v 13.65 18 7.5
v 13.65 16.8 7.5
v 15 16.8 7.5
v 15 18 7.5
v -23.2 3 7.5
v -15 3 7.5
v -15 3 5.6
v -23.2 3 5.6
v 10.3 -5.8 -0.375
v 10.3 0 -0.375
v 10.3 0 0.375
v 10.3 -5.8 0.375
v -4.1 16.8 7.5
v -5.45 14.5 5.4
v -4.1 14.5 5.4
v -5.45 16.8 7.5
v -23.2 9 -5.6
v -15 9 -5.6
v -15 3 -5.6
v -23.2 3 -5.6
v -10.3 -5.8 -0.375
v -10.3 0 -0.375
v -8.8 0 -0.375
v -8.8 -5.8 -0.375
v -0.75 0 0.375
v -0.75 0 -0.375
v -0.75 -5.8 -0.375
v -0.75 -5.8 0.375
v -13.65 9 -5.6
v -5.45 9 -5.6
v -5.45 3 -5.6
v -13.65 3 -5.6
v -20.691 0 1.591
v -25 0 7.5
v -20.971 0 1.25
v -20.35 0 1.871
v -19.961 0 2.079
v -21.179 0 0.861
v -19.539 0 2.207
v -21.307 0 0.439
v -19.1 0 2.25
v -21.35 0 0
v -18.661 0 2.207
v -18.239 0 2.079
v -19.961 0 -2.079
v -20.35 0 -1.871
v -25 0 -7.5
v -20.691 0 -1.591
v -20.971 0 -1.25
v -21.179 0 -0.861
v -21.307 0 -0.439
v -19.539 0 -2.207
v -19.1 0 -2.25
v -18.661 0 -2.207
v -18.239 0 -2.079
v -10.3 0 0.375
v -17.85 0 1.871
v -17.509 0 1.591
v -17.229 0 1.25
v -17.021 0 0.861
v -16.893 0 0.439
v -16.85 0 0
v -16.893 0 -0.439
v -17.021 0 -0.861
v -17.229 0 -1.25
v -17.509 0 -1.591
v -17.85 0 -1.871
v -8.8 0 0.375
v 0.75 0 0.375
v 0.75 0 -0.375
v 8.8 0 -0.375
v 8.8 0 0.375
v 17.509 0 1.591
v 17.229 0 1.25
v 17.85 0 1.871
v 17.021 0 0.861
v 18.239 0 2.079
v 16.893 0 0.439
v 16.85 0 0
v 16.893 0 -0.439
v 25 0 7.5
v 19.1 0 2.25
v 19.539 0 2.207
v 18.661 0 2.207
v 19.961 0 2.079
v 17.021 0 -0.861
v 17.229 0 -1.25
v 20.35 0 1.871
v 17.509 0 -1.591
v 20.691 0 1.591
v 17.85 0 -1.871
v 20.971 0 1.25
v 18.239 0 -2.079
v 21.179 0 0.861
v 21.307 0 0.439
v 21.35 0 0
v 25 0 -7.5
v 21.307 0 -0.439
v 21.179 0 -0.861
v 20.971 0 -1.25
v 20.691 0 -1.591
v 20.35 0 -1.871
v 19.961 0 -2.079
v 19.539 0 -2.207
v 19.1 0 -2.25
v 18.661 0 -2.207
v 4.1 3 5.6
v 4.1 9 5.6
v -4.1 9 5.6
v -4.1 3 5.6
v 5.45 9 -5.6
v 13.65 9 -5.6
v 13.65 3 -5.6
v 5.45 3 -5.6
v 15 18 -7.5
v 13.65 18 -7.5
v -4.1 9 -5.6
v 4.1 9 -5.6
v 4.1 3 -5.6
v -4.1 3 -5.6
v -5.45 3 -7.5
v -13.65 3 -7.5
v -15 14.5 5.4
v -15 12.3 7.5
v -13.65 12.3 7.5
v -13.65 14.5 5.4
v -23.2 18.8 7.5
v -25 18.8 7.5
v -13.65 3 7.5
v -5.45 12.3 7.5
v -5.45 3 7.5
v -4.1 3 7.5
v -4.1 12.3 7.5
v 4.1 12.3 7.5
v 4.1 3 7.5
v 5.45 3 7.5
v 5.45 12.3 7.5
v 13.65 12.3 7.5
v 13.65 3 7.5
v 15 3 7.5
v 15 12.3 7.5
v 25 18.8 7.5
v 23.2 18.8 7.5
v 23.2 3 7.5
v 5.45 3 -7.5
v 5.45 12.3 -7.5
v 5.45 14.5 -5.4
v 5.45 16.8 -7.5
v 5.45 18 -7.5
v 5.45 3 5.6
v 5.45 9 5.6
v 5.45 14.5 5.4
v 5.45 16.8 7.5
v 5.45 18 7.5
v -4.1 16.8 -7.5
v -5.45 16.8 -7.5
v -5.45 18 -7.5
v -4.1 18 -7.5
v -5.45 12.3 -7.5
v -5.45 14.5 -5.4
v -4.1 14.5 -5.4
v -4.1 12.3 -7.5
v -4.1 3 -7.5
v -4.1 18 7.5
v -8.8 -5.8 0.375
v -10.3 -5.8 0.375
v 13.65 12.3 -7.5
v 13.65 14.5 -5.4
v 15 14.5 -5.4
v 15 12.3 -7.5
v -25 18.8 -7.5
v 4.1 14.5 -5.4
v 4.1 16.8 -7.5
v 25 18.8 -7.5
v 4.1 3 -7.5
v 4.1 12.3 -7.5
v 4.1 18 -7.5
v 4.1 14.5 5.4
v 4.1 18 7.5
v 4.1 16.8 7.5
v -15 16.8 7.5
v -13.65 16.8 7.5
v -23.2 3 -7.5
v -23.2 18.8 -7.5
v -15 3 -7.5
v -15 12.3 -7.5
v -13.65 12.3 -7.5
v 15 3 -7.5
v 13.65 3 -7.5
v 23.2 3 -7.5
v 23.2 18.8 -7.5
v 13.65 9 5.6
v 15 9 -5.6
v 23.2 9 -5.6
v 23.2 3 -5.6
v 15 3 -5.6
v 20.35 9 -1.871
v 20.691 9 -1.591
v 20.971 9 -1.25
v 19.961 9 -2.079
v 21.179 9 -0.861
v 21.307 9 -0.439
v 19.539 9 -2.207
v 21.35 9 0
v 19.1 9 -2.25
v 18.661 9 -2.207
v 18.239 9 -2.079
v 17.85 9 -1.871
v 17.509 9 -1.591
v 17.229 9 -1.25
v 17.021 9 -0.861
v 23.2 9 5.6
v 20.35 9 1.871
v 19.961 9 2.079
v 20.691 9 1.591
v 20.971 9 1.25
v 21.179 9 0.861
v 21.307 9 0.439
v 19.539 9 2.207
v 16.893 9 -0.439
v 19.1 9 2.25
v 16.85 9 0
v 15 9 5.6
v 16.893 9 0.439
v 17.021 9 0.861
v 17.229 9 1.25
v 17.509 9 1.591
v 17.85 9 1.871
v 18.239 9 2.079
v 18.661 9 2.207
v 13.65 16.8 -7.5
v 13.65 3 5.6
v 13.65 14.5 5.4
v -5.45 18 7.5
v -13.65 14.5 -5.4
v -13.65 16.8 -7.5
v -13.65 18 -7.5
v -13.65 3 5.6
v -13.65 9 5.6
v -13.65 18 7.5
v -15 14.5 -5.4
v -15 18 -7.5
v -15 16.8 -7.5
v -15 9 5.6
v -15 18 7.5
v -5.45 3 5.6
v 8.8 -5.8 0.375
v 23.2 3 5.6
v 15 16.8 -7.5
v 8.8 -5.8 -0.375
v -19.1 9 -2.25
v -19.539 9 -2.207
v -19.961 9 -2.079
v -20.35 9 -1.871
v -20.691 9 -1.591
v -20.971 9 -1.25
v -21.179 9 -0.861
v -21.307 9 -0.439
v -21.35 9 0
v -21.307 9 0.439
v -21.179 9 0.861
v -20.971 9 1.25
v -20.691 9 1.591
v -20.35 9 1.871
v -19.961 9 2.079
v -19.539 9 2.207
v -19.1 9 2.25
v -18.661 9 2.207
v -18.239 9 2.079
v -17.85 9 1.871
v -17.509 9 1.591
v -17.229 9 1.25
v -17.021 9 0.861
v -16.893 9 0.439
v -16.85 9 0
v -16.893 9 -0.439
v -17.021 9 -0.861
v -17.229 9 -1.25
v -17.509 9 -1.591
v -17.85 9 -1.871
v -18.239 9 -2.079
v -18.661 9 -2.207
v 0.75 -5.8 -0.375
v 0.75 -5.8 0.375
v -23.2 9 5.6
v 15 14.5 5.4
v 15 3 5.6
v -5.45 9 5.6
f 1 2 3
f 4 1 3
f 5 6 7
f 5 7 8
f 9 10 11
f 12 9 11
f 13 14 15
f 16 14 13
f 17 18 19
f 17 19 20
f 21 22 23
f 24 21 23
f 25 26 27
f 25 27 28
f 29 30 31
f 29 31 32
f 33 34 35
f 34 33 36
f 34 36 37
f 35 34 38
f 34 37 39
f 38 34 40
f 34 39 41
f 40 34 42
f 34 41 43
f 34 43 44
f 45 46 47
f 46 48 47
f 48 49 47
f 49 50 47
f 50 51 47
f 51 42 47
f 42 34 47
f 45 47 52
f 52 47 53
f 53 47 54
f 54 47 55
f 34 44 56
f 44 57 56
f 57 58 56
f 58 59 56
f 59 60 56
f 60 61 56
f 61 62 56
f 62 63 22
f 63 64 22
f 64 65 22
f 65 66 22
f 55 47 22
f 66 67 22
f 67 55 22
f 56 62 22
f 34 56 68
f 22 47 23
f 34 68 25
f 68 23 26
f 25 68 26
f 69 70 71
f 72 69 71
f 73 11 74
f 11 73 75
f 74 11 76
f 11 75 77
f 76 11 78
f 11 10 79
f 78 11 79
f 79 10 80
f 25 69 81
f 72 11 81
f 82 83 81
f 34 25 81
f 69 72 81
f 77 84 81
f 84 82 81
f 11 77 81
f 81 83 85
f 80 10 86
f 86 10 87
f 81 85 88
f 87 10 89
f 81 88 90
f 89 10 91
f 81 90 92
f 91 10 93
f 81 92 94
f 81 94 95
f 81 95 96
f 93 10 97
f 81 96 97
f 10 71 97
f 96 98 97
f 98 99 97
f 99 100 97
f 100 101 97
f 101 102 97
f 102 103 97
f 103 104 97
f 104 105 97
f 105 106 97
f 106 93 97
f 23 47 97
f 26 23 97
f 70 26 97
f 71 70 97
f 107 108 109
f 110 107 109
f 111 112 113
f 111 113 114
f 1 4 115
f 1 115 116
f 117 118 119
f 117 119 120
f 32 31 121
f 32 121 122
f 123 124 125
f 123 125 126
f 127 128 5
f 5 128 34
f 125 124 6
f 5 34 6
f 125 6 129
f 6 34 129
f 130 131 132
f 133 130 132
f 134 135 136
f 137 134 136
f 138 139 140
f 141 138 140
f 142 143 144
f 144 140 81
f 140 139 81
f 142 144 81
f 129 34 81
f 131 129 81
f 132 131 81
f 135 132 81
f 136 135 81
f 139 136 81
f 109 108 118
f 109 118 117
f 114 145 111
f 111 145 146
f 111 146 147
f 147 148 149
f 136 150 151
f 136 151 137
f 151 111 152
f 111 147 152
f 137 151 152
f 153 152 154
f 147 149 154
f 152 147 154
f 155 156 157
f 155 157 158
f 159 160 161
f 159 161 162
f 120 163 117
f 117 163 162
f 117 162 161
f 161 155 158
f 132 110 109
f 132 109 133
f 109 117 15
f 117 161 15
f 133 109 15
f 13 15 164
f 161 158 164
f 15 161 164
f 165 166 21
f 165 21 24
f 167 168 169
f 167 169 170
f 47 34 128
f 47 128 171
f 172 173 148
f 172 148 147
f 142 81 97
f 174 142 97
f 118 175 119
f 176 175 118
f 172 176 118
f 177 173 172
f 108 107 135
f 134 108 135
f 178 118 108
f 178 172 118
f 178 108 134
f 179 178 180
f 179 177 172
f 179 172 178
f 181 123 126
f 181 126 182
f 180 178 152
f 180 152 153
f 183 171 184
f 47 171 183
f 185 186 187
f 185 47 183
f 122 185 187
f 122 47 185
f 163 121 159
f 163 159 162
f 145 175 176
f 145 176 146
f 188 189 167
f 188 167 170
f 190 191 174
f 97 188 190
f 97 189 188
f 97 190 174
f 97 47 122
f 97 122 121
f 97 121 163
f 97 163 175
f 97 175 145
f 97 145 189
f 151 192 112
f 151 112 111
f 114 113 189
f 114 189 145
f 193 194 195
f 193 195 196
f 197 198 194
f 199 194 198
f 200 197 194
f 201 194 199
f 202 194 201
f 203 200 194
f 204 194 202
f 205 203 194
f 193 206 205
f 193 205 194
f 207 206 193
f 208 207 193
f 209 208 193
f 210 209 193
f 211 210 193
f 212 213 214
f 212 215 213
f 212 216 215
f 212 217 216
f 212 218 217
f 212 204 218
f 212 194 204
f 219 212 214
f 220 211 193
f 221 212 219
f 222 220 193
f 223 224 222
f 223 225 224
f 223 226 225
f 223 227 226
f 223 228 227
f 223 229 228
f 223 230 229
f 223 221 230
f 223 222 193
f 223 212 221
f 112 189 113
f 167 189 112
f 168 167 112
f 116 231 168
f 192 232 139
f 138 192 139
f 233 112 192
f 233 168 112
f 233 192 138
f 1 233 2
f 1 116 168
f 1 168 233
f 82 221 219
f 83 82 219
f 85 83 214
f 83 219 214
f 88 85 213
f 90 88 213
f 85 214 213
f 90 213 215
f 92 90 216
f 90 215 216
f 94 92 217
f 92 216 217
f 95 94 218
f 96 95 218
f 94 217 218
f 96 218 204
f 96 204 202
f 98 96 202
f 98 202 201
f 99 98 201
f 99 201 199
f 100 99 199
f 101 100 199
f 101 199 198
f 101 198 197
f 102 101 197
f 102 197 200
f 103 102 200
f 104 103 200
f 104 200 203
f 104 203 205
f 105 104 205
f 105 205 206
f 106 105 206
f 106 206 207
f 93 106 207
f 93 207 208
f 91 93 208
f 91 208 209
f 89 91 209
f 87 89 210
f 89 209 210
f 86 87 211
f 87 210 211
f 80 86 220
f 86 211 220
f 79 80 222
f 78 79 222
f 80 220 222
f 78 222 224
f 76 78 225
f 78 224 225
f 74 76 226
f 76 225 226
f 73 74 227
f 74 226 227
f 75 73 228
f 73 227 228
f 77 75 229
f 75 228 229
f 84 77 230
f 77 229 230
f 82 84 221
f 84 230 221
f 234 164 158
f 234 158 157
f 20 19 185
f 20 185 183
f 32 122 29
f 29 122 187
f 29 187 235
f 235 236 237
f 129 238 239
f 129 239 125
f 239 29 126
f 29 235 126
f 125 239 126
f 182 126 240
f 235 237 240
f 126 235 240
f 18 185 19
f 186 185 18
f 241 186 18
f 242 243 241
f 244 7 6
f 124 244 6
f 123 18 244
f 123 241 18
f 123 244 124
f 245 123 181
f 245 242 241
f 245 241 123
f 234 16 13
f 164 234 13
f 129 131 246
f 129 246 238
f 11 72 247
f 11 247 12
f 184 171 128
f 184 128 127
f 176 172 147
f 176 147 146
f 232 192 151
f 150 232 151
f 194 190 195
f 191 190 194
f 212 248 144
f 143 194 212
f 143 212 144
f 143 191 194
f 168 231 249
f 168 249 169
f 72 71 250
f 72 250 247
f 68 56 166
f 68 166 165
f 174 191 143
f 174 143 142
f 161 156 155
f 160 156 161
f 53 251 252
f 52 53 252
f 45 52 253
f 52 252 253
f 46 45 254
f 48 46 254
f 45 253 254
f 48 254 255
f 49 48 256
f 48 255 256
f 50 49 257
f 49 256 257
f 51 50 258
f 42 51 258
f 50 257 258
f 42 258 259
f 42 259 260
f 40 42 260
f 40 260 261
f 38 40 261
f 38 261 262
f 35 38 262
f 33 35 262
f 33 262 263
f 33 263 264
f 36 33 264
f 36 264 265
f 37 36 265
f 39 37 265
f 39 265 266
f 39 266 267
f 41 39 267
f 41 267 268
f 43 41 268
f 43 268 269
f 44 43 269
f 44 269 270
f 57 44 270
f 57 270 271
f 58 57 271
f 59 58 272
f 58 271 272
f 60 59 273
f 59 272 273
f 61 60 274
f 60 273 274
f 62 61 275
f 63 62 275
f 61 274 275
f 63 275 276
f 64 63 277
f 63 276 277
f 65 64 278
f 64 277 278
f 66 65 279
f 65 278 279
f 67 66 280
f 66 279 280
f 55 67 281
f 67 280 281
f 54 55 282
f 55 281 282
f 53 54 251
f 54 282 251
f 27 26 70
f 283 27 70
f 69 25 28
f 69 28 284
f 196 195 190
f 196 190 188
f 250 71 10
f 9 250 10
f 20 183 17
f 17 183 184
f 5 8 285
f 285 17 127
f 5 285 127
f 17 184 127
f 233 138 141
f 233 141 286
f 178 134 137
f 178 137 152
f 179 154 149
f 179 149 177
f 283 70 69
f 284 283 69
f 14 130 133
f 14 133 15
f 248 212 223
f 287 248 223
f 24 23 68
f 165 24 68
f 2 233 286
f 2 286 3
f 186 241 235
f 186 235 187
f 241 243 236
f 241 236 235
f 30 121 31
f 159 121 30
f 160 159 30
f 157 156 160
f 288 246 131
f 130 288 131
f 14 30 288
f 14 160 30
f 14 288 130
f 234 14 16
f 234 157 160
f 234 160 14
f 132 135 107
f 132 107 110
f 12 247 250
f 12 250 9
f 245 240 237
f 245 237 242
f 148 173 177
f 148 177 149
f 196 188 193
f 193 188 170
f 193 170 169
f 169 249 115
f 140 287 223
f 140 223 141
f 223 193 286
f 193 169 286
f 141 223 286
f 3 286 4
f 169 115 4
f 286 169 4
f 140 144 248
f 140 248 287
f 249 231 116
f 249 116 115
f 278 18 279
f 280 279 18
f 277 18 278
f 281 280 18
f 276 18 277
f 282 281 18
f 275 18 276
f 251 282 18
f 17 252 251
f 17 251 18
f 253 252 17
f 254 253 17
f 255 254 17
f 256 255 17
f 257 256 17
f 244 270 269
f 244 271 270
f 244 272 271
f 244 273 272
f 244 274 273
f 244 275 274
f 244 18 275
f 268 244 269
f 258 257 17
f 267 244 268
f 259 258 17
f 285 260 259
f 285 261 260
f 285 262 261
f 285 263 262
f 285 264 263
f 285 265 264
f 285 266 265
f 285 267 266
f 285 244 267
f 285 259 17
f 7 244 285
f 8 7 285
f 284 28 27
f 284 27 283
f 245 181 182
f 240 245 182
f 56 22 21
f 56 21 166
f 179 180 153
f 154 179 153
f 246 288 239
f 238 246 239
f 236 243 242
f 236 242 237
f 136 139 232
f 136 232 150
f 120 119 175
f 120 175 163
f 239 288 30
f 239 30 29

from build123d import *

# Parameters (mm, degrees)
SKETCH_1_W          = 50
SKETCH_1_H          = 15
EXTRUDE_1_DEPTH     = 18.8
SKETCH_2_W          = 46.4
SKETCH_2_H          = 15
CUT_EXTRUDE_1_DEPTH = 0.8
SKETCH_4_W          = 8.2
SKETCH_4_H          = 15
CUT_EXTRUDE_2_DEPTH = 9
SKETCH_5_W          = 8.2
SKETCH_5_H          = 1.9
CUT_EXTRUDE_3_DEPTH = 15
SKETCH_6_W          = 1.5
SKETCH_6_H          = 0.75
EXTRUDE_2_DEPTH     = 5.8
SKETCH_7_R          = 2.25
CUT_EXTRUDE_4_DEPTH = 31.004832944
CUT_EXTRUDE_START   = -30
CUT_EXTRUDE_5_DEPTH = 30


with BuildPart() as part:
    # 草图1 → 拉伸1 (new body)
    with BuildSketch(Plane(origin=(0, 0, 0), x_dir=(1, 0, 0), z_dir=(0, 1, 0))):
        Rectangle(SKETCH_1_W, SKETCH_1_H)
    extrude(amount=EXTRUDE_1_DEPTH)

    # 草图2 → 切除-拉伸1 (cut)
    with BuildSketch(Plane(origin=(0, 18.8, 0), x_dir=(-1, 0, 0), z_dir=(0, 1, 0))):
        Rectangle(SKETCH_2_W, SKETCH_2_H)
    extrude(amount=-CUT_EXTRUDE_1_DEPTH, mode=Mode.SUBTRACT)

    # 草图4 → 切除-拉伸2 (cut)
    with BuildSketch(Plane(origin=(0, 18, 0), x_dir=(-1, 0, 0), z_dir=(0, 1, 0))):
        with Locations((-19.1, 0)):
            Rectangle(SKETCH_4_W, SKETCH_4_H)
        with Locations((-9.55, 0)):
            Rectangle(SKETCH_4_W, SKETCH_4_H)
        Rectangle(SKETCH_4_W, SKETCH_4_H)
        with Locations((9.55, 0)):
            Rectangle(SKETCH_4_W, SKETCH_4_H)
        with Locations((19.1, 0)):
            Rectangle(SKETCH_4_W, SKETCH_4_H)
    extrude(amount=-CUT_EXTRUDE_2_DEPTH, mode=Mode.SUBTRACT)

    # 草图5 → 切除-拉伸3 (cut)
    with BuildSketch(Plane(origin=(0, 18, 0), x_dir=(-1, 0, 0), z_dir=(0, 1, 0))):
        with Locations((19.1, -6.55)):
            Rectangle(SKETCH_5_W, SKETCH_5_H)
        with Locations((19.1, 6.55)):
            Rectangle(SKETCH_5_W, SKETCH_5_H)
        with Locations((9.55, -6.55)):
            Rectangle(SKETCH_5_W, SKETCH_5_H)
        with Locations((9.55, 6.55)):
            Rectangle(SKETCH_5_W, SKETCH_5_H)
        with Locations((0, -6.55)):
            Rectangle(SKETCH_5_W, SKETCH_5_H)
        with Locations((0, 6.55)):
            Rectangle(SKETCH_5_W, SKETCH_5_H)
        with Locations((-9.55, -6.55)):
            Rectangle(SKETCH_5_W, SKETCH_5_H)
        with Locations((-9.55, 6.55)):
            Rectangle(SKETCH_5_W, SKETCH_5_H)
        with Locations((-19.1, -6.55)):
            Rectangle(SKETCH_5_W, SKETCH_5_H)
        with Locations((-19.1, 6.55)):
            Rectangle(SKETCH_5_W, SKETCH_5_H)
    extrude(amount=-CUT_EXTRUDE_3_DEPTH, mode=Mode.SUBTRACT)

    # 草图6 → 拉伸2 (add)
    with BuildSketch(Plane.XZ):
        Rectangle(SKETCH_6_W, SKETCH_6_H)
        with Locations((9.55, 0)):
            Rectangle(SKETCH_6_W, SKETCH_6_H)
        with Locations((-9.55, 0)):
            Rectangle(SKETCH_6_W, SKETCH_6_H)
    extrude(amount=EXTRUDE_2_DEPTH)

    # 草图7 → 切除-拉伸4 (cut, through all)
    with BuildSketch(Plane(origin=(0, 9, 0), x_dir=(-1, 0, 0), z_dir=(0, 1, 0))):
        with Locations(Location((-19.1, 0, 0), (0, 0, 90))):
            Circle(SKETCH_7_R)
        with Locations(Location((19.1, 0, 0), (0, 0, 270))):
            Circle(SKETCH_7_R)
    extrude(amount=-CUT_EXTRUDE_4_DEPTH, mode=Mode.SUBTRACT)

    # 草图8 → 切除-拉伸5 (cut)
    with BuildSketch(Plane(origin=(15, 0, 0), x_dir=(0, 0, -1), z_dir=(1, 0, 0)).offset(CUT_EXTRUDE_START)):
        Polygon((7.5, 16.8), (5.4, 14.5), (7.5, 12.3), align=None)
        Polygon((-7.5, 16.8), (-7.5, 12.3), (-5.4, 14.5), align=None)
    extrude(amount=CUT_EXTRUDE_5_DEPTH, mode=Mode.SUBTRACT)


solid = part.part
